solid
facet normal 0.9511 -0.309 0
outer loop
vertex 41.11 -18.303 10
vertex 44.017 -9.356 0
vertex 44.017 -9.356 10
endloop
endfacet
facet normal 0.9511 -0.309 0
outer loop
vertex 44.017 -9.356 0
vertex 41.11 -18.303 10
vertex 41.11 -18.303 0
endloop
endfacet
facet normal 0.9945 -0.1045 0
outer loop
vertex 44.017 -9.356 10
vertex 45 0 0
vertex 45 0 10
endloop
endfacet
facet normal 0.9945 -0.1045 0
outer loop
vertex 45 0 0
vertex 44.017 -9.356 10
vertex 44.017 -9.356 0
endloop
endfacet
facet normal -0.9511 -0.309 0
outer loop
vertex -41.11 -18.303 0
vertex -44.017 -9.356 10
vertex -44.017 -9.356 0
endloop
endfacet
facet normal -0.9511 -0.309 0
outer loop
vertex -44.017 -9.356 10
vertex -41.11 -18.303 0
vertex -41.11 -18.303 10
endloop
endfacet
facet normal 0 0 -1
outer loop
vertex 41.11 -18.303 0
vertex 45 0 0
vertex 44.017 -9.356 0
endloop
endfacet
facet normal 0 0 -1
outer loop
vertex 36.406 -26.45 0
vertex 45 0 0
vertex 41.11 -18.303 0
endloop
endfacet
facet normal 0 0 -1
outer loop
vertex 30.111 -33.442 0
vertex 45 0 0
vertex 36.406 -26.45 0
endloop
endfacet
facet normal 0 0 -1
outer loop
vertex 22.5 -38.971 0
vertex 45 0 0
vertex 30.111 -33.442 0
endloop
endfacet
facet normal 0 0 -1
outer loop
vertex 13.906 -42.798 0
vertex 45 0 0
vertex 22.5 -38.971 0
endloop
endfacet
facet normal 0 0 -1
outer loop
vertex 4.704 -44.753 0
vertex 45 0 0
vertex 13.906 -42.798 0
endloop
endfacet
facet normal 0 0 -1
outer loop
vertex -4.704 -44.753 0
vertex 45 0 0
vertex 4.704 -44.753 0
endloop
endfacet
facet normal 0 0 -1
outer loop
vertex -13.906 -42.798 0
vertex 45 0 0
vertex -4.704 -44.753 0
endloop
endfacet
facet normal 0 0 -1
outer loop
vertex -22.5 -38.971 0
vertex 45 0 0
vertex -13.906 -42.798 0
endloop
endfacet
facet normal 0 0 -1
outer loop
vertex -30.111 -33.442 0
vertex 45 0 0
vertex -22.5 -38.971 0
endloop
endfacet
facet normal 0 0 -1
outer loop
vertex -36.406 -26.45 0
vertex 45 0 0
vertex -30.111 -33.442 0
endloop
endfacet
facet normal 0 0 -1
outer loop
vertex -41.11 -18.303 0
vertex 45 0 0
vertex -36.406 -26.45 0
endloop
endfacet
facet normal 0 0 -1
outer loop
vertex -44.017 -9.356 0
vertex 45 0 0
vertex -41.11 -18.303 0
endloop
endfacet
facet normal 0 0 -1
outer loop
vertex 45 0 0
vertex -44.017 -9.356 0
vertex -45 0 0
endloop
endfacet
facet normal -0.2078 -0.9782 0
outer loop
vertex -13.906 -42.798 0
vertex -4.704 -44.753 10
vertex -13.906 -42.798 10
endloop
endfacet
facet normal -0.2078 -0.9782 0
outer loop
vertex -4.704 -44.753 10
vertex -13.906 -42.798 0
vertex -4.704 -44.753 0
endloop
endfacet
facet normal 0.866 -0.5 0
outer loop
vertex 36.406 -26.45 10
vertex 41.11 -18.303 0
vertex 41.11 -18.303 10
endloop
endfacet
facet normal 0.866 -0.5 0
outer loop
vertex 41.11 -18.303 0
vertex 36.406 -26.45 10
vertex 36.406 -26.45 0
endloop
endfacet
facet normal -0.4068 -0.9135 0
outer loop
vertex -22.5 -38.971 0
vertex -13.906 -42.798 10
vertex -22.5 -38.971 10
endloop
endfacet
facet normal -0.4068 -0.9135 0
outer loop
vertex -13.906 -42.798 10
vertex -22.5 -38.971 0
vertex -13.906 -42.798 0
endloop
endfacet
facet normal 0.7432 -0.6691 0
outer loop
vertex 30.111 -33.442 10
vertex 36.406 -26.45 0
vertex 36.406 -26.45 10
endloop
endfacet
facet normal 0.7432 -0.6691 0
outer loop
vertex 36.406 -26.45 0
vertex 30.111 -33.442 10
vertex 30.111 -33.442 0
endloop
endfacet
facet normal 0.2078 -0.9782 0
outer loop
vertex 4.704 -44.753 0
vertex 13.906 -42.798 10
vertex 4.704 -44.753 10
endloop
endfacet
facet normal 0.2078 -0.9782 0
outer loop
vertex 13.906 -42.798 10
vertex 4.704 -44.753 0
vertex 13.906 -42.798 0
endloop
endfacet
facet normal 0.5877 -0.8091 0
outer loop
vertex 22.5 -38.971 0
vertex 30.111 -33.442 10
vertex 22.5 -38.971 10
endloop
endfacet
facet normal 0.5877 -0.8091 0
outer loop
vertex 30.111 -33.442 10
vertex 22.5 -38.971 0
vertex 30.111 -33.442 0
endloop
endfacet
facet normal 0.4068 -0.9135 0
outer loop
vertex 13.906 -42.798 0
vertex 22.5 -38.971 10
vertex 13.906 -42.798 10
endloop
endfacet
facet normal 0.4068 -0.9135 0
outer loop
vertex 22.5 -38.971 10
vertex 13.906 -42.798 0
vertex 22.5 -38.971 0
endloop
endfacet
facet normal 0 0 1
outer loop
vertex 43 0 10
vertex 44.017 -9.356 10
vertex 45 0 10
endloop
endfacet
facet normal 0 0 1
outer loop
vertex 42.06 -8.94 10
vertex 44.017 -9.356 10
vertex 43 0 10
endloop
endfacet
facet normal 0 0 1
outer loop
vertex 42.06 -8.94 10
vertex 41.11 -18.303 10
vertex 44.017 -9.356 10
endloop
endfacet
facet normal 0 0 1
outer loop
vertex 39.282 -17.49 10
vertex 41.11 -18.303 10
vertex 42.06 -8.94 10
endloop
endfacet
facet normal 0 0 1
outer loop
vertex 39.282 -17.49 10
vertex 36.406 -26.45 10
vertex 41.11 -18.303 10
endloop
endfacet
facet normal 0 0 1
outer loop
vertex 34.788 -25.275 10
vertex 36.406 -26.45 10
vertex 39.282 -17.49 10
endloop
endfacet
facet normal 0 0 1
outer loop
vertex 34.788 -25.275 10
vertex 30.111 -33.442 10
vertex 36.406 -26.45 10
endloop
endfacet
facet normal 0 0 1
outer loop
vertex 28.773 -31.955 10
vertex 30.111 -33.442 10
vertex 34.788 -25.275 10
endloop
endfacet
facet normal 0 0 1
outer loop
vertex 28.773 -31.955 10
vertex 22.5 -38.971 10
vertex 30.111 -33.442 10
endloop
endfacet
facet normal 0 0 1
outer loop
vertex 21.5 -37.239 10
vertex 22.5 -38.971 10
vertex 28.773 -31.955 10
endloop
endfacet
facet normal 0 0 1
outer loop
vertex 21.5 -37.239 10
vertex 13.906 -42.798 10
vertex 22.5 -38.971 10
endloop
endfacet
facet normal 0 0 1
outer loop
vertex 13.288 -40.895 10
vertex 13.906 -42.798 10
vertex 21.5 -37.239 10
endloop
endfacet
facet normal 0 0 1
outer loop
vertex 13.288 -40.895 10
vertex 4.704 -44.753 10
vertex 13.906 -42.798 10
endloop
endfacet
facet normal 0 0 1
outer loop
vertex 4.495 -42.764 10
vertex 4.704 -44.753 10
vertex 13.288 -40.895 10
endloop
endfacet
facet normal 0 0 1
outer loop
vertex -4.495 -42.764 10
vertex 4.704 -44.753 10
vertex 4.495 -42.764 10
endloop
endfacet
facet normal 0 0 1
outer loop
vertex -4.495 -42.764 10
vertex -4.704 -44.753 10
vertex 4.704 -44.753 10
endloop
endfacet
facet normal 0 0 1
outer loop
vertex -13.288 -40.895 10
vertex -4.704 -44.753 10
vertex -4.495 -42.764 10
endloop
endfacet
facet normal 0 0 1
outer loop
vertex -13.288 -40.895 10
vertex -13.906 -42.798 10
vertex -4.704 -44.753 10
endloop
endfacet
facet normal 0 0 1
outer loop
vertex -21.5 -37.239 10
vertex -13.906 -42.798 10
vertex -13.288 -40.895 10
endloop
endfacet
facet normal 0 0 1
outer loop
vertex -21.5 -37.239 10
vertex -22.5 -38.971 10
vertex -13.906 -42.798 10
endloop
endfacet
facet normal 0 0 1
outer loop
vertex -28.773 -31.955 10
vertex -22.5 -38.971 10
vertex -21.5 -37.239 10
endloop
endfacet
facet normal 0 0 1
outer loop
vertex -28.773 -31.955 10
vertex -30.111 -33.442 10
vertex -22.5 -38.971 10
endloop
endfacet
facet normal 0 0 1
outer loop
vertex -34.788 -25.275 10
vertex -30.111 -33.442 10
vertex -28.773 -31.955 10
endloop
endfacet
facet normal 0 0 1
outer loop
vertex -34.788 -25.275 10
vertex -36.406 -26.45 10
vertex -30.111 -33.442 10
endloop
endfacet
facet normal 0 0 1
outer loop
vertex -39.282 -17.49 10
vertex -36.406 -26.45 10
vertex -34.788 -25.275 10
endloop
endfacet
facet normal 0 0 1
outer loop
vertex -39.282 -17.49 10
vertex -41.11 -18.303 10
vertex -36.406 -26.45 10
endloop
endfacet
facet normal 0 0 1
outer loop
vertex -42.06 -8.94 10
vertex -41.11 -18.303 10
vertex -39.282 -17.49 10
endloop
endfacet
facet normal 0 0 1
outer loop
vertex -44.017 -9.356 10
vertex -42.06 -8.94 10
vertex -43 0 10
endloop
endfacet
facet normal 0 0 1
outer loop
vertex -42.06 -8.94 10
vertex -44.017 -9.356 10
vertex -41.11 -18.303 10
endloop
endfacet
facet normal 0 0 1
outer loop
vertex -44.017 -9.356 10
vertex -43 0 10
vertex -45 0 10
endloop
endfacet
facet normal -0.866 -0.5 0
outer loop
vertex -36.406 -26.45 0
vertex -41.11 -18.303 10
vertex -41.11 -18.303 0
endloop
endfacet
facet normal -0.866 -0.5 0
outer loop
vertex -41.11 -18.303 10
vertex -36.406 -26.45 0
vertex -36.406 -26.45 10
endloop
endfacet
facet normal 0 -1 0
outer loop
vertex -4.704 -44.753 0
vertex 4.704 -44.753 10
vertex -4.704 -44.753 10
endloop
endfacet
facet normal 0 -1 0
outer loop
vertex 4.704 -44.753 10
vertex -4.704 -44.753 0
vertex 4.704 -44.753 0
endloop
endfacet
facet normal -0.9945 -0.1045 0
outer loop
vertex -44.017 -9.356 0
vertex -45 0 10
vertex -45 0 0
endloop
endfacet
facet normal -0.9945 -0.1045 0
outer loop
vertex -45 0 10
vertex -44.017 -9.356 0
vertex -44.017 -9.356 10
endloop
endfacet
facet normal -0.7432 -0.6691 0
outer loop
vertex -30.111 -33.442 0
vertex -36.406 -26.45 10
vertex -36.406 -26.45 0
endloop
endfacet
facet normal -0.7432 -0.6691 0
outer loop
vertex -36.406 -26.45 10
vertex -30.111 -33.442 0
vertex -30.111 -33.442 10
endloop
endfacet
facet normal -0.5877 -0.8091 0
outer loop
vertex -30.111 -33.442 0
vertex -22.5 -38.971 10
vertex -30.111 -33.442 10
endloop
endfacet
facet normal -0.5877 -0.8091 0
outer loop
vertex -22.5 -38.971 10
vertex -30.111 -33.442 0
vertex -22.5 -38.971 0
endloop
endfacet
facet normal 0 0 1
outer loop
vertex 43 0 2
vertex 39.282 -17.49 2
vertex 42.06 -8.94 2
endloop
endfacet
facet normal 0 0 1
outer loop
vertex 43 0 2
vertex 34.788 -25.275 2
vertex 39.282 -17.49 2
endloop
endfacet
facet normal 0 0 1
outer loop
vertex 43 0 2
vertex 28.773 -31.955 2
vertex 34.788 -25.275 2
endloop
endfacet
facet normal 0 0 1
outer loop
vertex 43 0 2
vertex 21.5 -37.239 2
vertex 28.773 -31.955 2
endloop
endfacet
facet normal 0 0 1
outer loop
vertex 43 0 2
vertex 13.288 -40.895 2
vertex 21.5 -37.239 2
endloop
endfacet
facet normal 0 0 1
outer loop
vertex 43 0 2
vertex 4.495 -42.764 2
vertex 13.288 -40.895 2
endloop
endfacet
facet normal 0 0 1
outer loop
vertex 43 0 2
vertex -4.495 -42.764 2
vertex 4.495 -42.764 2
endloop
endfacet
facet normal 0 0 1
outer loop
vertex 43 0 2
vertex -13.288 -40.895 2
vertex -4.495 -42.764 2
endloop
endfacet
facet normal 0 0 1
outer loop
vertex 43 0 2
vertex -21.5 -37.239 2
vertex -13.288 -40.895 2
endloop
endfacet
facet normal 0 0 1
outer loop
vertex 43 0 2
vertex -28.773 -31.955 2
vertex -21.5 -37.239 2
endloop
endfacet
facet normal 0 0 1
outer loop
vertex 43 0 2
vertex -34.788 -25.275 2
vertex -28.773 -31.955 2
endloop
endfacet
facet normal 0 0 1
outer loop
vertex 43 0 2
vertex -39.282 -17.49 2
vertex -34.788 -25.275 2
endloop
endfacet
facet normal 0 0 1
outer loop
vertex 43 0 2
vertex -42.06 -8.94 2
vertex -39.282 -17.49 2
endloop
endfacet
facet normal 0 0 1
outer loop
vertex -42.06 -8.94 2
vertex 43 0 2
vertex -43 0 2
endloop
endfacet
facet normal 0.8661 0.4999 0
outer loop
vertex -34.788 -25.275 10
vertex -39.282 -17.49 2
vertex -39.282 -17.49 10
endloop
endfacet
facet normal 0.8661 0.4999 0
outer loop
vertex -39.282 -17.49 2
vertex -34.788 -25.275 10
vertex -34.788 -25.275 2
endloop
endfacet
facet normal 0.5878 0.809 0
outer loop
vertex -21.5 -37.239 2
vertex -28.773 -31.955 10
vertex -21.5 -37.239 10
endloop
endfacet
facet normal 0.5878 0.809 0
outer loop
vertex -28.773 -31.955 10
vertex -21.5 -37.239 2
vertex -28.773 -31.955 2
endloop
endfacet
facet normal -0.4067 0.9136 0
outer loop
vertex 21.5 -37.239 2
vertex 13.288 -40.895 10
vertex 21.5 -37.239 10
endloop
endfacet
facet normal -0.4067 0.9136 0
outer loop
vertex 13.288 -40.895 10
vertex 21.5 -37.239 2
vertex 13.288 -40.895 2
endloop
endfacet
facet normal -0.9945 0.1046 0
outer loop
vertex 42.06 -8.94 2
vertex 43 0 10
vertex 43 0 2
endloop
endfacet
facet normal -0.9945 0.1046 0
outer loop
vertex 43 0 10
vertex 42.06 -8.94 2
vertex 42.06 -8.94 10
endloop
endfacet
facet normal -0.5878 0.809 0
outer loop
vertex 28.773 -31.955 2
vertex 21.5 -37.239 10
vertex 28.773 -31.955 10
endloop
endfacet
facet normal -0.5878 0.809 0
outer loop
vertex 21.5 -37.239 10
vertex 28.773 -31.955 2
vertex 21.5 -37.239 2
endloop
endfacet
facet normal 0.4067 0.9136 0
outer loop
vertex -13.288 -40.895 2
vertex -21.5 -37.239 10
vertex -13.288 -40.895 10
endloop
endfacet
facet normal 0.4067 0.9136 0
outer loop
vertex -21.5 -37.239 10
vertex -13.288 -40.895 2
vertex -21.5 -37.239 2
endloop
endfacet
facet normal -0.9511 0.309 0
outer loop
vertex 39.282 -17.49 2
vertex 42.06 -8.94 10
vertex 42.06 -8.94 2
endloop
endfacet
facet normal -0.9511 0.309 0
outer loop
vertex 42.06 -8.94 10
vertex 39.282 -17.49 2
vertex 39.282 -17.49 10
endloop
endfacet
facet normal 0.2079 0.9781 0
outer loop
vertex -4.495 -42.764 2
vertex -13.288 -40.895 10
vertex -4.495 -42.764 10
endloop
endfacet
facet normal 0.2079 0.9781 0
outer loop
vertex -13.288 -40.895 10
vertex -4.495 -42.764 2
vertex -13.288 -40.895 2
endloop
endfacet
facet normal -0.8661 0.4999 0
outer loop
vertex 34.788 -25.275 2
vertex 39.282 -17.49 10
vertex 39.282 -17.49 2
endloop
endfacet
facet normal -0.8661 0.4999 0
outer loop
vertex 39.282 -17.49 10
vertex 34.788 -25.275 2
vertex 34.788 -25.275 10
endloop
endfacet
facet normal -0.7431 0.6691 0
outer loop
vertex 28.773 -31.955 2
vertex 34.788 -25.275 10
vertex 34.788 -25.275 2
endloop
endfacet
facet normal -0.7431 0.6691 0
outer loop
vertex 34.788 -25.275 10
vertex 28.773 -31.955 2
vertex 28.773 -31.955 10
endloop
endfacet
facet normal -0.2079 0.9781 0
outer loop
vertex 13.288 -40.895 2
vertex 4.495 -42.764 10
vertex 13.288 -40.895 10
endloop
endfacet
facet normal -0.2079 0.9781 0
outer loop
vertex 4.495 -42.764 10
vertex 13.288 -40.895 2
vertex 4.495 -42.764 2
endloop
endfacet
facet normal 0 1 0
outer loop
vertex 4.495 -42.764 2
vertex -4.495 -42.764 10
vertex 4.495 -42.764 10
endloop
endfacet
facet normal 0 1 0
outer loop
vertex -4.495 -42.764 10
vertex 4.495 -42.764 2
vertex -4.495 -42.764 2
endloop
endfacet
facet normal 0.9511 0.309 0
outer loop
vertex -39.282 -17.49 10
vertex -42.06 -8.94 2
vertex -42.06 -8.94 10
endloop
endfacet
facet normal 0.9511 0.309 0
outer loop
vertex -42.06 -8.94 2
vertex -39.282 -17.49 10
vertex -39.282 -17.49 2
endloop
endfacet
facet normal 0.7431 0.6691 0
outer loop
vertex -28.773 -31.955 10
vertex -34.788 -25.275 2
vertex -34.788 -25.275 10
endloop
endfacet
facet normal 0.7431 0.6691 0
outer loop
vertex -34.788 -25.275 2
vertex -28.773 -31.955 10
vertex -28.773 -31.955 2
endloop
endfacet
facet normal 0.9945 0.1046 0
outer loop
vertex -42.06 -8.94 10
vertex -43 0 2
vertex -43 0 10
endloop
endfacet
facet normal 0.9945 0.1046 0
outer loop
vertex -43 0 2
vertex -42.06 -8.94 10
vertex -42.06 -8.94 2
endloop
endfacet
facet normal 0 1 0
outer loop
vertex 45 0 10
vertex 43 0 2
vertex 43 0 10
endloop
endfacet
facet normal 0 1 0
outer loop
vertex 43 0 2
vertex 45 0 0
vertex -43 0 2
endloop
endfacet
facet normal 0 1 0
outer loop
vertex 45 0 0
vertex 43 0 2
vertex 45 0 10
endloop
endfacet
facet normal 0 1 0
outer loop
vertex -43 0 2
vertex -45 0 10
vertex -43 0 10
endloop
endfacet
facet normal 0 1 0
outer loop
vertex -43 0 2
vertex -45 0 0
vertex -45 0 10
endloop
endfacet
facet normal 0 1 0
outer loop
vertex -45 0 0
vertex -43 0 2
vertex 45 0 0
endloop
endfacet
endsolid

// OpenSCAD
$fn=30;
difference(){
	difference(){
		cylinder(h=10, r=45);
		translate([0,0,2])
			cylinder(h=15,r=43);
	}

	translate([-45,0,-1])
		cube(112);
}
